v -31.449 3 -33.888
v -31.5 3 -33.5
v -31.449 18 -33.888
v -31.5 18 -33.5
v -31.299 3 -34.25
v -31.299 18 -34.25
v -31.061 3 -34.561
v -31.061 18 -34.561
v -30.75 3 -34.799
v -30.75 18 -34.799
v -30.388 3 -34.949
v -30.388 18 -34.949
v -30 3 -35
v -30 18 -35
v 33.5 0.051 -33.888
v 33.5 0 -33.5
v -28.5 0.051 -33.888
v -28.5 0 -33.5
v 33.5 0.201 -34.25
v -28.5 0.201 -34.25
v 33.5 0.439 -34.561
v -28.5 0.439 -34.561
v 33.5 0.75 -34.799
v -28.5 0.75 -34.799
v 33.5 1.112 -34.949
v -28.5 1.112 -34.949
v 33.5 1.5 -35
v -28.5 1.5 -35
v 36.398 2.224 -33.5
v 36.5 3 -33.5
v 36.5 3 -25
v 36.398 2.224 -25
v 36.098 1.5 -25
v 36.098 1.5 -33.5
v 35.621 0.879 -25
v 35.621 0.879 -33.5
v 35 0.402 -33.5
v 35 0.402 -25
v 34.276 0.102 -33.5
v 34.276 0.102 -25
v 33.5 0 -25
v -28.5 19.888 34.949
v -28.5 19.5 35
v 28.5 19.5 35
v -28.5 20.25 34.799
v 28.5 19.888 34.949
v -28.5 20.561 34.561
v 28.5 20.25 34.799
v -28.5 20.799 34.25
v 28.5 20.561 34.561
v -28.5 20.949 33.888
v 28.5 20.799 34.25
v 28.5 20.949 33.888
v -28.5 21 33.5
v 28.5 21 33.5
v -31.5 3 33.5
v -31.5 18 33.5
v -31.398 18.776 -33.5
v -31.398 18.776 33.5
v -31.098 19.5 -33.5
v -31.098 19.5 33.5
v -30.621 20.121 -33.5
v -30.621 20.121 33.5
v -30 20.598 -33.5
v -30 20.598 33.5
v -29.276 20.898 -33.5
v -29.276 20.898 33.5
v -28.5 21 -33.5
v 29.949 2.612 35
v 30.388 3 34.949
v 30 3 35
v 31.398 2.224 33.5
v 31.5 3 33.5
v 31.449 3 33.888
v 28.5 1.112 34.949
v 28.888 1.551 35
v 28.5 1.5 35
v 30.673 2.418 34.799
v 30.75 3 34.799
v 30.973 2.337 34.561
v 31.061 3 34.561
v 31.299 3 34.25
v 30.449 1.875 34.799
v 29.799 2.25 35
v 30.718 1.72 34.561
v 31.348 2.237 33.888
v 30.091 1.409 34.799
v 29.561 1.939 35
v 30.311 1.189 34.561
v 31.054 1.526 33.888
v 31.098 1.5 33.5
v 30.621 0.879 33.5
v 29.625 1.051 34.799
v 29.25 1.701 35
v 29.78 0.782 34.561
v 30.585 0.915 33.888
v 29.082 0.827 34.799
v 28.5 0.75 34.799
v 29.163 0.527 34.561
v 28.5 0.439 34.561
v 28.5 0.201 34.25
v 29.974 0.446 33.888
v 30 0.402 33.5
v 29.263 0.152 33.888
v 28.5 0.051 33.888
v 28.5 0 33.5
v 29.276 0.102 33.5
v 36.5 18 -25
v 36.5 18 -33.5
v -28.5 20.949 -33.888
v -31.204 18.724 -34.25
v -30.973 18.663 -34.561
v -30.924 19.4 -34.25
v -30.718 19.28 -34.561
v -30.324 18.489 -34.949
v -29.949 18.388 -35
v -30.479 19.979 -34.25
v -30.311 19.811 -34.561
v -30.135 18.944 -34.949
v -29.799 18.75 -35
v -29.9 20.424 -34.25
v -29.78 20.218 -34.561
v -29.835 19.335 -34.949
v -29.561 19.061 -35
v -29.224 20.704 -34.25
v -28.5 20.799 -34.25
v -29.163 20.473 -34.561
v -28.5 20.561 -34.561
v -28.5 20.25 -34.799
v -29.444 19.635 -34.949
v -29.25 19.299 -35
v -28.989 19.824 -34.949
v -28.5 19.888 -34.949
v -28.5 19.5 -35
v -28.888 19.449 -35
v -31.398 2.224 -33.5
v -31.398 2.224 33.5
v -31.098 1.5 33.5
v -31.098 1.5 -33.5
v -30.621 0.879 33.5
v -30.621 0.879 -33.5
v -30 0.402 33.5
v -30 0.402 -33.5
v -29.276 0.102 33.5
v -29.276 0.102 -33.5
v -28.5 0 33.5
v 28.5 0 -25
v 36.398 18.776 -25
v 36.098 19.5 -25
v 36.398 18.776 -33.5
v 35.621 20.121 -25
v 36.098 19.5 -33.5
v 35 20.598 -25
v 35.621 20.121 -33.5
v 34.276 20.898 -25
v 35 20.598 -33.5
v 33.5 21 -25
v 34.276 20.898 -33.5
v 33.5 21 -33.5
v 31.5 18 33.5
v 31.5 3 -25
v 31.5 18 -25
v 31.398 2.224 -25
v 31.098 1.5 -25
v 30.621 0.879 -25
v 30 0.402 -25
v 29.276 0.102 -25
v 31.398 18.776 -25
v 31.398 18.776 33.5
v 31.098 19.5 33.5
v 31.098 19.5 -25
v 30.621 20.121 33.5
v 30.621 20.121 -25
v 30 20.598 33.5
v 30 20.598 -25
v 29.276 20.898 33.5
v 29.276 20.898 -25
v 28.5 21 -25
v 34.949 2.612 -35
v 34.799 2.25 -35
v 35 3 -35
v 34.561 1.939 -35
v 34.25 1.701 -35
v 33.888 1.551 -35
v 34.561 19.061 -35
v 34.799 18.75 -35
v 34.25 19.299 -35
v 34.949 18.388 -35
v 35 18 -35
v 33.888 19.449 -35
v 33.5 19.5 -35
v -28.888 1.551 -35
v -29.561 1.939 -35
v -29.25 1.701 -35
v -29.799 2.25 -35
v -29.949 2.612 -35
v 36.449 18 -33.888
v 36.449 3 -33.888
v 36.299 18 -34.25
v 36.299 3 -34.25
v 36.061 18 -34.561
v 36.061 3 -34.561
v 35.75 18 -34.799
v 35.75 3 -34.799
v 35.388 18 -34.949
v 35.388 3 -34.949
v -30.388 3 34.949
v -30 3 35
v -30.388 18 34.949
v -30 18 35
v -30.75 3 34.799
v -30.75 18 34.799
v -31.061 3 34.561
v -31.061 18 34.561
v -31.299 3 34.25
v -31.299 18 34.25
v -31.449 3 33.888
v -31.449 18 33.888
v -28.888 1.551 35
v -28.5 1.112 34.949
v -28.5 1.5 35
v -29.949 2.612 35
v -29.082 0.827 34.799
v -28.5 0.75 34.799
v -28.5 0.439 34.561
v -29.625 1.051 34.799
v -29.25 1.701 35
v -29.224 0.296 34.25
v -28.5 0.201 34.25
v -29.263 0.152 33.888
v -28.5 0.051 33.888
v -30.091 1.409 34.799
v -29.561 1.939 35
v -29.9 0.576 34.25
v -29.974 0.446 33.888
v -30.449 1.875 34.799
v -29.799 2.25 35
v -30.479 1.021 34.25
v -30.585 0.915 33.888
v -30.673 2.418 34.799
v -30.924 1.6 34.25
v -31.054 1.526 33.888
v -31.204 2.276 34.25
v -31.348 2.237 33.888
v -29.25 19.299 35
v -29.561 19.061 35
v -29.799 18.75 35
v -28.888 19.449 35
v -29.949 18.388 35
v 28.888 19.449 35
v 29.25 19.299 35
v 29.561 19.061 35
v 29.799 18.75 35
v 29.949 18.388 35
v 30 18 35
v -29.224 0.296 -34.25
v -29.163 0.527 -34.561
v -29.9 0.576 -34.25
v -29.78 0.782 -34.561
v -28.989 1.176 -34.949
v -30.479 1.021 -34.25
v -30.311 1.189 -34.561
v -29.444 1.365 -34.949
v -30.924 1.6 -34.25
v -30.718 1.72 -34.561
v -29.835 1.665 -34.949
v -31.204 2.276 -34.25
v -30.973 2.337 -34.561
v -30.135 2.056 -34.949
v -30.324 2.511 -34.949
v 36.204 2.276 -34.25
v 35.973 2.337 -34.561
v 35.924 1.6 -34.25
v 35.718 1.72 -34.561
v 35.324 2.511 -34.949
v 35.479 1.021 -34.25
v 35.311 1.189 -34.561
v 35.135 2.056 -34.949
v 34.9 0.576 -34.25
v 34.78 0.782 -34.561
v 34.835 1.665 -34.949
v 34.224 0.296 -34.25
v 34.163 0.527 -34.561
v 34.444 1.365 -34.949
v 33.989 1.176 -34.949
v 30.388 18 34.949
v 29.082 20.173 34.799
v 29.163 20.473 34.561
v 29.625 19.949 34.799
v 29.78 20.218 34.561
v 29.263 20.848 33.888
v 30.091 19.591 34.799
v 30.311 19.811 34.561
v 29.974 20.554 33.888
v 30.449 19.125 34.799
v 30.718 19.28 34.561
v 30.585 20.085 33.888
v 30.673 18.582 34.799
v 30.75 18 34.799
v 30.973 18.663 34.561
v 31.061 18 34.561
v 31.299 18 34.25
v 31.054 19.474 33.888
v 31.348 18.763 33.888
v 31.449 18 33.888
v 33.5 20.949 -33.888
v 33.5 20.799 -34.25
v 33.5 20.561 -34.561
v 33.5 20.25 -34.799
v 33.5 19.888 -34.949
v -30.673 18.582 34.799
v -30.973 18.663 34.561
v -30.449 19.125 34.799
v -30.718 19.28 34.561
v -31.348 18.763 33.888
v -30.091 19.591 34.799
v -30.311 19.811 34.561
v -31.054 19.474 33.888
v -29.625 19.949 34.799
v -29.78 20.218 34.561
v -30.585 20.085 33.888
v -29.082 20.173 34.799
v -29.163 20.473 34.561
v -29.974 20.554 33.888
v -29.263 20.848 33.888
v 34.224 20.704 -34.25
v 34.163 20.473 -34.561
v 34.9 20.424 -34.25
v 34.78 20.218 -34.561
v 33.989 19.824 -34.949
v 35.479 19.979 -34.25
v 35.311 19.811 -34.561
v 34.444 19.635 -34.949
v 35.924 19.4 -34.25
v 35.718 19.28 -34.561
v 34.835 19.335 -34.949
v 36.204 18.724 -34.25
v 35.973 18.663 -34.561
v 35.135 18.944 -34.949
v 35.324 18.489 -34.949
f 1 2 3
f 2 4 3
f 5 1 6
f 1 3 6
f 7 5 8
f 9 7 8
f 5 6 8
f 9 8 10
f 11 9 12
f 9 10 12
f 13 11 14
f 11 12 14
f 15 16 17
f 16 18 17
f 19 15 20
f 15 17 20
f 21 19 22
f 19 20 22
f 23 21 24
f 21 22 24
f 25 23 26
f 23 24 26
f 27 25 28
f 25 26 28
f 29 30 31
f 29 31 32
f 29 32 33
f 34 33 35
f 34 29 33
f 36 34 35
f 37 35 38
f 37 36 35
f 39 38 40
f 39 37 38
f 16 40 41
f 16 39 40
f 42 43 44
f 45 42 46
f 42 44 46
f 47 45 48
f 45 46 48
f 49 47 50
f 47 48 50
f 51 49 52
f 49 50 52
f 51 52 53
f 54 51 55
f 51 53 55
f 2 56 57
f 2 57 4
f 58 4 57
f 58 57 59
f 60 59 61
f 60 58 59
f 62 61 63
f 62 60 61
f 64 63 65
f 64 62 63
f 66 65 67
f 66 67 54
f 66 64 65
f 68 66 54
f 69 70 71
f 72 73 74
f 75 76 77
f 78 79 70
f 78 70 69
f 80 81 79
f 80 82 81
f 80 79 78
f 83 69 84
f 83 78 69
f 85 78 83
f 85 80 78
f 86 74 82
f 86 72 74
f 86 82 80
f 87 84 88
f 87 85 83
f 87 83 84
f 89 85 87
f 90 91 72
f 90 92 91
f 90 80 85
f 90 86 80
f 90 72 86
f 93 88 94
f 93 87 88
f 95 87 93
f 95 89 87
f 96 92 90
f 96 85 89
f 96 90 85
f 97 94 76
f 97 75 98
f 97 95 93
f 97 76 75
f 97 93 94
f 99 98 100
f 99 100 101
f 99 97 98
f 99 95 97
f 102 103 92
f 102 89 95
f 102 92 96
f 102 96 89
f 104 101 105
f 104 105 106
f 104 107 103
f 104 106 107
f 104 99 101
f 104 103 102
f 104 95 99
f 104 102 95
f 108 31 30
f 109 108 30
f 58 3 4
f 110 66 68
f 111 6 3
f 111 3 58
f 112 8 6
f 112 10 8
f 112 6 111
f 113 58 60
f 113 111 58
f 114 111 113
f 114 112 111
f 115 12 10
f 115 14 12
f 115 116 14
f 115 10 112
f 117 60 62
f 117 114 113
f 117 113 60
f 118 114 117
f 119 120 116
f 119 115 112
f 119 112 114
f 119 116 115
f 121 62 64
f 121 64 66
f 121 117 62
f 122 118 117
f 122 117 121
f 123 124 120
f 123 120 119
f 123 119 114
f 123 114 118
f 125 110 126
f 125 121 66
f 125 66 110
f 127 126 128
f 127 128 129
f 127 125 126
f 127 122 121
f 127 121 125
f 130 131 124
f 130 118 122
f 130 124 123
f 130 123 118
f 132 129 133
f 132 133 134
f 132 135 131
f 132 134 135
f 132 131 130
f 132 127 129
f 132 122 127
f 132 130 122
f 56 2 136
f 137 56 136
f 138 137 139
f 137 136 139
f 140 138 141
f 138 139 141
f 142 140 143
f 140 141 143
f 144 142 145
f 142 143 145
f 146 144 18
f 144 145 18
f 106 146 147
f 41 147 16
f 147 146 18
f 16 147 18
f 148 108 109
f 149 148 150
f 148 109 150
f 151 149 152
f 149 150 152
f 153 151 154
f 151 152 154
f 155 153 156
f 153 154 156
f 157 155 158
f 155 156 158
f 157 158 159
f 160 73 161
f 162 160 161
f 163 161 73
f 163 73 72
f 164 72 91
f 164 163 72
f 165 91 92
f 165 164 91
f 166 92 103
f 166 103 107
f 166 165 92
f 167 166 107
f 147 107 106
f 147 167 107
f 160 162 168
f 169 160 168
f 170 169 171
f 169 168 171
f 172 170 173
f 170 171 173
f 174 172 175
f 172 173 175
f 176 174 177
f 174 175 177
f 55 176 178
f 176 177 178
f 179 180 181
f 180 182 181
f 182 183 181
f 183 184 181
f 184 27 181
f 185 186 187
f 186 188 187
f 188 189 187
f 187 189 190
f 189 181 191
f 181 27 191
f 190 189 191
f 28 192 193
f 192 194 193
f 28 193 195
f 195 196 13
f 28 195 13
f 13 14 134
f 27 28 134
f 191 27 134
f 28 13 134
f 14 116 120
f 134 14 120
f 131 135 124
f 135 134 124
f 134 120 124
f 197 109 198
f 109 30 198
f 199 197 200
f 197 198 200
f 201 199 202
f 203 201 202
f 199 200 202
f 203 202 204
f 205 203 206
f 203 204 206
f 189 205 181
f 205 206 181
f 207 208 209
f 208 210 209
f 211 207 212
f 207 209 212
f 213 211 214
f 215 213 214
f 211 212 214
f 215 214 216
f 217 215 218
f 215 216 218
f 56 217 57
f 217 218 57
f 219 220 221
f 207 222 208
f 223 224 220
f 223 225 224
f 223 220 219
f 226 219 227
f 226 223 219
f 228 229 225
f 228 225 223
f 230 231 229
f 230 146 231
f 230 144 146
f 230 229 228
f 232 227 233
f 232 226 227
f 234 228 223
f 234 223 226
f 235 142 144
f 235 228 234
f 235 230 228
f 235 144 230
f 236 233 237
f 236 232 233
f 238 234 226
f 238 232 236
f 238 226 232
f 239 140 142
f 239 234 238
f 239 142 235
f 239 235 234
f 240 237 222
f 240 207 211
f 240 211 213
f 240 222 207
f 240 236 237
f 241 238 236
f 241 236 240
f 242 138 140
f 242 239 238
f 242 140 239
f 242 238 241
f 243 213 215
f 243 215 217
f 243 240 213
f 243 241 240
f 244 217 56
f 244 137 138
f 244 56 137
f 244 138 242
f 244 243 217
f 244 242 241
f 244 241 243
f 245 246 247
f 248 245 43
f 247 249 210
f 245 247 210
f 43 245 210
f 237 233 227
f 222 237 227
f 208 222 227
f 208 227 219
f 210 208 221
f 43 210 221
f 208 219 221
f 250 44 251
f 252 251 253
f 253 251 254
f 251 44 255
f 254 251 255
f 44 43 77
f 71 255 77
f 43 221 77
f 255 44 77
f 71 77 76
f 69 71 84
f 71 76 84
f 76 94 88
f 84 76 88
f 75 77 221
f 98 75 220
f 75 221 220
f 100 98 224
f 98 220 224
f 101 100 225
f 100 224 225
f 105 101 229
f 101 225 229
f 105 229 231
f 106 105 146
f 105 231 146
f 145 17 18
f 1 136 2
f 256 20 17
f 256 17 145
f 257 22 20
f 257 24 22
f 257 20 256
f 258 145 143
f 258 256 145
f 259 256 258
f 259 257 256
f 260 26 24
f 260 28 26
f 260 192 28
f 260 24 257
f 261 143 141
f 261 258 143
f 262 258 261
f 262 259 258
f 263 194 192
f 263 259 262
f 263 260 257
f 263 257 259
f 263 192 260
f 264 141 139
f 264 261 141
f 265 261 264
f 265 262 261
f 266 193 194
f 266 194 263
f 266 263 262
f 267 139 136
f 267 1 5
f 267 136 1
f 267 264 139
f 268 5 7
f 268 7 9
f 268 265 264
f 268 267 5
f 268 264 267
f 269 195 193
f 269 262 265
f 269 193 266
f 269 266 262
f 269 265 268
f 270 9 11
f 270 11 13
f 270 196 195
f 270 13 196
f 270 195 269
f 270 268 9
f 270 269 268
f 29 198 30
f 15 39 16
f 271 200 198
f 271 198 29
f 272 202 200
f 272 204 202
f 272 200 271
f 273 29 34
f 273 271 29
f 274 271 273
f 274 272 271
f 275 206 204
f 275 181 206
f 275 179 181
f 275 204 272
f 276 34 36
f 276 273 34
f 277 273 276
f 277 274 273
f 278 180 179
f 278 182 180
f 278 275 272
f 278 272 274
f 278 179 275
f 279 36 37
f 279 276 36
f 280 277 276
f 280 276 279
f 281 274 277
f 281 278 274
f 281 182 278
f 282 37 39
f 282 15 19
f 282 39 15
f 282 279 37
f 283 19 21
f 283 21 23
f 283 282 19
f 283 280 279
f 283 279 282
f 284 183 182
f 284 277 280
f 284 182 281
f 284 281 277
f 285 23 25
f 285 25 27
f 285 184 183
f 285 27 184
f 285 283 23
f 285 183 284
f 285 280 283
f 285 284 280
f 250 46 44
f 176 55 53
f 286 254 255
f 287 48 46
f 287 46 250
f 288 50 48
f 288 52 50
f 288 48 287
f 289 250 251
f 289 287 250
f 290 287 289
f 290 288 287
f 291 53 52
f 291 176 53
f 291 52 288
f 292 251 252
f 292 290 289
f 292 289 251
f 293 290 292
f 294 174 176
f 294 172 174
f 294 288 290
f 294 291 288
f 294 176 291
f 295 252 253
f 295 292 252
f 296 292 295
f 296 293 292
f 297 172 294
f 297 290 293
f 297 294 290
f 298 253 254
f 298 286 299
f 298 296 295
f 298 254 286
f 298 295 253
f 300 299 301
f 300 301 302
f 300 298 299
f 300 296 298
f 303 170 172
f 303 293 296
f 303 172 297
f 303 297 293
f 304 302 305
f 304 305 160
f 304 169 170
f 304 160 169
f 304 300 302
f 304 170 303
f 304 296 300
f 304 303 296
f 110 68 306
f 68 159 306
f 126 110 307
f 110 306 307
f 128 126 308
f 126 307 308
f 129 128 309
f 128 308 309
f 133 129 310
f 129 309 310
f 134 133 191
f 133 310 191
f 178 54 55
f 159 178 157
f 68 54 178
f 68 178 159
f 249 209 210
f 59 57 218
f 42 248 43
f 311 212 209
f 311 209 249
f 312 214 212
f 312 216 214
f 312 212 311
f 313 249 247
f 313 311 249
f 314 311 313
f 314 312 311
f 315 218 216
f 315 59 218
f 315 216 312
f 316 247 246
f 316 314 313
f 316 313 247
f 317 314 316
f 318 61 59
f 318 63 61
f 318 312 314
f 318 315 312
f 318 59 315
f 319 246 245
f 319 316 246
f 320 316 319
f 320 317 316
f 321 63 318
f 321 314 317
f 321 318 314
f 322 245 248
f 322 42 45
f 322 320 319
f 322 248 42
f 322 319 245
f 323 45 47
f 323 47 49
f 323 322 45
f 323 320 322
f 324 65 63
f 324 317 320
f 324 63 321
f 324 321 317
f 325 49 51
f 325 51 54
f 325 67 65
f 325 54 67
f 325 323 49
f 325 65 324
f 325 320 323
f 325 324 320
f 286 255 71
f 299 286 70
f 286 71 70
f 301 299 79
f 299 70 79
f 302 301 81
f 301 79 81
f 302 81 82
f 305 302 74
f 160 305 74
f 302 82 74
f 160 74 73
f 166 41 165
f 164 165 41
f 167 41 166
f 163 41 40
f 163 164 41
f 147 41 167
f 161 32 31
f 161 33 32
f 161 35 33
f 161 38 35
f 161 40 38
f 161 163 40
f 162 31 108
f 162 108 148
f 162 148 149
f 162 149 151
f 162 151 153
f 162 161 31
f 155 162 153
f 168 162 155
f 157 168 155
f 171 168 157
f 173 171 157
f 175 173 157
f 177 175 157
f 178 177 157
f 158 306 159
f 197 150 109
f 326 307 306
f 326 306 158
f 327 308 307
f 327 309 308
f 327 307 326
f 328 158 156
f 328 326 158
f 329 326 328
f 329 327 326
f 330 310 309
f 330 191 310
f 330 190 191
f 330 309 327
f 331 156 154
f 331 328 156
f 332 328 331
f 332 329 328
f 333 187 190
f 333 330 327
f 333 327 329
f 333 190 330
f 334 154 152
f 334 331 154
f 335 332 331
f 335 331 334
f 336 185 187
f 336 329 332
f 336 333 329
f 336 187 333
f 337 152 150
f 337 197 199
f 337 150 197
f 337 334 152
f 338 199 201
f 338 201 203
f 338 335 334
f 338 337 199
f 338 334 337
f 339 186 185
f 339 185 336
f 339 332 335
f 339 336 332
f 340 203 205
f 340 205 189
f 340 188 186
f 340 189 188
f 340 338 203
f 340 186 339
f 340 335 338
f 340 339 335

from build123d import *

# Parameters (mm, degrees)
SKETCH1_W           = 63
SKETCH1_H           = 70
BOSS_EXTRUDE1_DEPTH = 21
SKETCH2_W           = 10
SKETCH2_H           = 21
BOSS_EXTRUDE2_DEPTH = 5
FILLET3_R           = 3
FILLET4_R           = 1.5


with BuildPart() as part:
    # Sketch1 → Boss-Extrude1 (new body)
    with BuildSketch(Plane(origin=(0, 0, 0), x_dir=(1, 0, 0), z_dir=(0, 1, 0))):
        Rectangle(SKETCH1_W, SKETCH1_H)
    extrude(amount=BOSS_EXTRUDE1_DEPTH)

    # Sketch2 → Boss-Extrude2 (add)
    with BuildSketch(Plane(origin=(31.5, 0, 0), x_dir=(0, 0, -1), z_dir=(1, 0, 0))):
        with Locations((30, 10.5)):
            Rectangle(SKETCH2_W, SKETCH2_H)
    extrude(amount=BOSS_EXTRUDE2_DEPTH)

    # Fillet3
    fillet3_edges = [part.edges().sort_by_distance(p)[0] for p in [
        (31.5, 0, 5),
        (31.5, 21, 5),
        (36.5, 21, -30),
        (36.5, 0, -30),
        (-31.5, 21, 0),
        (-31.5, 0, 0),
    ]]
    fillet(fillet3_edges, radius=FILLET3_R)

    # Fillet4
    fillet4_edges = [part.edges().sort_by_distance(p)[0] for p in [
        (-31.5, 10.5, 35),
        (-31.5, 10.5, -35),
        (0, 0, 35),
        (31.5, 10.5, 35),
        (0, 21, 35),
        (30.621320344, 20.121320344, 35),
        (30.621320344, 0.878679656, 35),
        (-30.621320344, 20.121320344, 35),
        (-30.621320344, 0.878679656, 35),
        (2.5, 0, -35),
        (2.5, 21, -35),
        (36.5, 10.5, -35),
        (35.621320344, 20.121320344, -35),
        (35.621320344, 0.878679656, -35),
        (-30.621320344, 20.121320344, -35),
        (-30.621320344, 0.878679656, -35),
    ]]
    fillet(fillet4_edges, radius=FILLET4_R)


solid = part.part
